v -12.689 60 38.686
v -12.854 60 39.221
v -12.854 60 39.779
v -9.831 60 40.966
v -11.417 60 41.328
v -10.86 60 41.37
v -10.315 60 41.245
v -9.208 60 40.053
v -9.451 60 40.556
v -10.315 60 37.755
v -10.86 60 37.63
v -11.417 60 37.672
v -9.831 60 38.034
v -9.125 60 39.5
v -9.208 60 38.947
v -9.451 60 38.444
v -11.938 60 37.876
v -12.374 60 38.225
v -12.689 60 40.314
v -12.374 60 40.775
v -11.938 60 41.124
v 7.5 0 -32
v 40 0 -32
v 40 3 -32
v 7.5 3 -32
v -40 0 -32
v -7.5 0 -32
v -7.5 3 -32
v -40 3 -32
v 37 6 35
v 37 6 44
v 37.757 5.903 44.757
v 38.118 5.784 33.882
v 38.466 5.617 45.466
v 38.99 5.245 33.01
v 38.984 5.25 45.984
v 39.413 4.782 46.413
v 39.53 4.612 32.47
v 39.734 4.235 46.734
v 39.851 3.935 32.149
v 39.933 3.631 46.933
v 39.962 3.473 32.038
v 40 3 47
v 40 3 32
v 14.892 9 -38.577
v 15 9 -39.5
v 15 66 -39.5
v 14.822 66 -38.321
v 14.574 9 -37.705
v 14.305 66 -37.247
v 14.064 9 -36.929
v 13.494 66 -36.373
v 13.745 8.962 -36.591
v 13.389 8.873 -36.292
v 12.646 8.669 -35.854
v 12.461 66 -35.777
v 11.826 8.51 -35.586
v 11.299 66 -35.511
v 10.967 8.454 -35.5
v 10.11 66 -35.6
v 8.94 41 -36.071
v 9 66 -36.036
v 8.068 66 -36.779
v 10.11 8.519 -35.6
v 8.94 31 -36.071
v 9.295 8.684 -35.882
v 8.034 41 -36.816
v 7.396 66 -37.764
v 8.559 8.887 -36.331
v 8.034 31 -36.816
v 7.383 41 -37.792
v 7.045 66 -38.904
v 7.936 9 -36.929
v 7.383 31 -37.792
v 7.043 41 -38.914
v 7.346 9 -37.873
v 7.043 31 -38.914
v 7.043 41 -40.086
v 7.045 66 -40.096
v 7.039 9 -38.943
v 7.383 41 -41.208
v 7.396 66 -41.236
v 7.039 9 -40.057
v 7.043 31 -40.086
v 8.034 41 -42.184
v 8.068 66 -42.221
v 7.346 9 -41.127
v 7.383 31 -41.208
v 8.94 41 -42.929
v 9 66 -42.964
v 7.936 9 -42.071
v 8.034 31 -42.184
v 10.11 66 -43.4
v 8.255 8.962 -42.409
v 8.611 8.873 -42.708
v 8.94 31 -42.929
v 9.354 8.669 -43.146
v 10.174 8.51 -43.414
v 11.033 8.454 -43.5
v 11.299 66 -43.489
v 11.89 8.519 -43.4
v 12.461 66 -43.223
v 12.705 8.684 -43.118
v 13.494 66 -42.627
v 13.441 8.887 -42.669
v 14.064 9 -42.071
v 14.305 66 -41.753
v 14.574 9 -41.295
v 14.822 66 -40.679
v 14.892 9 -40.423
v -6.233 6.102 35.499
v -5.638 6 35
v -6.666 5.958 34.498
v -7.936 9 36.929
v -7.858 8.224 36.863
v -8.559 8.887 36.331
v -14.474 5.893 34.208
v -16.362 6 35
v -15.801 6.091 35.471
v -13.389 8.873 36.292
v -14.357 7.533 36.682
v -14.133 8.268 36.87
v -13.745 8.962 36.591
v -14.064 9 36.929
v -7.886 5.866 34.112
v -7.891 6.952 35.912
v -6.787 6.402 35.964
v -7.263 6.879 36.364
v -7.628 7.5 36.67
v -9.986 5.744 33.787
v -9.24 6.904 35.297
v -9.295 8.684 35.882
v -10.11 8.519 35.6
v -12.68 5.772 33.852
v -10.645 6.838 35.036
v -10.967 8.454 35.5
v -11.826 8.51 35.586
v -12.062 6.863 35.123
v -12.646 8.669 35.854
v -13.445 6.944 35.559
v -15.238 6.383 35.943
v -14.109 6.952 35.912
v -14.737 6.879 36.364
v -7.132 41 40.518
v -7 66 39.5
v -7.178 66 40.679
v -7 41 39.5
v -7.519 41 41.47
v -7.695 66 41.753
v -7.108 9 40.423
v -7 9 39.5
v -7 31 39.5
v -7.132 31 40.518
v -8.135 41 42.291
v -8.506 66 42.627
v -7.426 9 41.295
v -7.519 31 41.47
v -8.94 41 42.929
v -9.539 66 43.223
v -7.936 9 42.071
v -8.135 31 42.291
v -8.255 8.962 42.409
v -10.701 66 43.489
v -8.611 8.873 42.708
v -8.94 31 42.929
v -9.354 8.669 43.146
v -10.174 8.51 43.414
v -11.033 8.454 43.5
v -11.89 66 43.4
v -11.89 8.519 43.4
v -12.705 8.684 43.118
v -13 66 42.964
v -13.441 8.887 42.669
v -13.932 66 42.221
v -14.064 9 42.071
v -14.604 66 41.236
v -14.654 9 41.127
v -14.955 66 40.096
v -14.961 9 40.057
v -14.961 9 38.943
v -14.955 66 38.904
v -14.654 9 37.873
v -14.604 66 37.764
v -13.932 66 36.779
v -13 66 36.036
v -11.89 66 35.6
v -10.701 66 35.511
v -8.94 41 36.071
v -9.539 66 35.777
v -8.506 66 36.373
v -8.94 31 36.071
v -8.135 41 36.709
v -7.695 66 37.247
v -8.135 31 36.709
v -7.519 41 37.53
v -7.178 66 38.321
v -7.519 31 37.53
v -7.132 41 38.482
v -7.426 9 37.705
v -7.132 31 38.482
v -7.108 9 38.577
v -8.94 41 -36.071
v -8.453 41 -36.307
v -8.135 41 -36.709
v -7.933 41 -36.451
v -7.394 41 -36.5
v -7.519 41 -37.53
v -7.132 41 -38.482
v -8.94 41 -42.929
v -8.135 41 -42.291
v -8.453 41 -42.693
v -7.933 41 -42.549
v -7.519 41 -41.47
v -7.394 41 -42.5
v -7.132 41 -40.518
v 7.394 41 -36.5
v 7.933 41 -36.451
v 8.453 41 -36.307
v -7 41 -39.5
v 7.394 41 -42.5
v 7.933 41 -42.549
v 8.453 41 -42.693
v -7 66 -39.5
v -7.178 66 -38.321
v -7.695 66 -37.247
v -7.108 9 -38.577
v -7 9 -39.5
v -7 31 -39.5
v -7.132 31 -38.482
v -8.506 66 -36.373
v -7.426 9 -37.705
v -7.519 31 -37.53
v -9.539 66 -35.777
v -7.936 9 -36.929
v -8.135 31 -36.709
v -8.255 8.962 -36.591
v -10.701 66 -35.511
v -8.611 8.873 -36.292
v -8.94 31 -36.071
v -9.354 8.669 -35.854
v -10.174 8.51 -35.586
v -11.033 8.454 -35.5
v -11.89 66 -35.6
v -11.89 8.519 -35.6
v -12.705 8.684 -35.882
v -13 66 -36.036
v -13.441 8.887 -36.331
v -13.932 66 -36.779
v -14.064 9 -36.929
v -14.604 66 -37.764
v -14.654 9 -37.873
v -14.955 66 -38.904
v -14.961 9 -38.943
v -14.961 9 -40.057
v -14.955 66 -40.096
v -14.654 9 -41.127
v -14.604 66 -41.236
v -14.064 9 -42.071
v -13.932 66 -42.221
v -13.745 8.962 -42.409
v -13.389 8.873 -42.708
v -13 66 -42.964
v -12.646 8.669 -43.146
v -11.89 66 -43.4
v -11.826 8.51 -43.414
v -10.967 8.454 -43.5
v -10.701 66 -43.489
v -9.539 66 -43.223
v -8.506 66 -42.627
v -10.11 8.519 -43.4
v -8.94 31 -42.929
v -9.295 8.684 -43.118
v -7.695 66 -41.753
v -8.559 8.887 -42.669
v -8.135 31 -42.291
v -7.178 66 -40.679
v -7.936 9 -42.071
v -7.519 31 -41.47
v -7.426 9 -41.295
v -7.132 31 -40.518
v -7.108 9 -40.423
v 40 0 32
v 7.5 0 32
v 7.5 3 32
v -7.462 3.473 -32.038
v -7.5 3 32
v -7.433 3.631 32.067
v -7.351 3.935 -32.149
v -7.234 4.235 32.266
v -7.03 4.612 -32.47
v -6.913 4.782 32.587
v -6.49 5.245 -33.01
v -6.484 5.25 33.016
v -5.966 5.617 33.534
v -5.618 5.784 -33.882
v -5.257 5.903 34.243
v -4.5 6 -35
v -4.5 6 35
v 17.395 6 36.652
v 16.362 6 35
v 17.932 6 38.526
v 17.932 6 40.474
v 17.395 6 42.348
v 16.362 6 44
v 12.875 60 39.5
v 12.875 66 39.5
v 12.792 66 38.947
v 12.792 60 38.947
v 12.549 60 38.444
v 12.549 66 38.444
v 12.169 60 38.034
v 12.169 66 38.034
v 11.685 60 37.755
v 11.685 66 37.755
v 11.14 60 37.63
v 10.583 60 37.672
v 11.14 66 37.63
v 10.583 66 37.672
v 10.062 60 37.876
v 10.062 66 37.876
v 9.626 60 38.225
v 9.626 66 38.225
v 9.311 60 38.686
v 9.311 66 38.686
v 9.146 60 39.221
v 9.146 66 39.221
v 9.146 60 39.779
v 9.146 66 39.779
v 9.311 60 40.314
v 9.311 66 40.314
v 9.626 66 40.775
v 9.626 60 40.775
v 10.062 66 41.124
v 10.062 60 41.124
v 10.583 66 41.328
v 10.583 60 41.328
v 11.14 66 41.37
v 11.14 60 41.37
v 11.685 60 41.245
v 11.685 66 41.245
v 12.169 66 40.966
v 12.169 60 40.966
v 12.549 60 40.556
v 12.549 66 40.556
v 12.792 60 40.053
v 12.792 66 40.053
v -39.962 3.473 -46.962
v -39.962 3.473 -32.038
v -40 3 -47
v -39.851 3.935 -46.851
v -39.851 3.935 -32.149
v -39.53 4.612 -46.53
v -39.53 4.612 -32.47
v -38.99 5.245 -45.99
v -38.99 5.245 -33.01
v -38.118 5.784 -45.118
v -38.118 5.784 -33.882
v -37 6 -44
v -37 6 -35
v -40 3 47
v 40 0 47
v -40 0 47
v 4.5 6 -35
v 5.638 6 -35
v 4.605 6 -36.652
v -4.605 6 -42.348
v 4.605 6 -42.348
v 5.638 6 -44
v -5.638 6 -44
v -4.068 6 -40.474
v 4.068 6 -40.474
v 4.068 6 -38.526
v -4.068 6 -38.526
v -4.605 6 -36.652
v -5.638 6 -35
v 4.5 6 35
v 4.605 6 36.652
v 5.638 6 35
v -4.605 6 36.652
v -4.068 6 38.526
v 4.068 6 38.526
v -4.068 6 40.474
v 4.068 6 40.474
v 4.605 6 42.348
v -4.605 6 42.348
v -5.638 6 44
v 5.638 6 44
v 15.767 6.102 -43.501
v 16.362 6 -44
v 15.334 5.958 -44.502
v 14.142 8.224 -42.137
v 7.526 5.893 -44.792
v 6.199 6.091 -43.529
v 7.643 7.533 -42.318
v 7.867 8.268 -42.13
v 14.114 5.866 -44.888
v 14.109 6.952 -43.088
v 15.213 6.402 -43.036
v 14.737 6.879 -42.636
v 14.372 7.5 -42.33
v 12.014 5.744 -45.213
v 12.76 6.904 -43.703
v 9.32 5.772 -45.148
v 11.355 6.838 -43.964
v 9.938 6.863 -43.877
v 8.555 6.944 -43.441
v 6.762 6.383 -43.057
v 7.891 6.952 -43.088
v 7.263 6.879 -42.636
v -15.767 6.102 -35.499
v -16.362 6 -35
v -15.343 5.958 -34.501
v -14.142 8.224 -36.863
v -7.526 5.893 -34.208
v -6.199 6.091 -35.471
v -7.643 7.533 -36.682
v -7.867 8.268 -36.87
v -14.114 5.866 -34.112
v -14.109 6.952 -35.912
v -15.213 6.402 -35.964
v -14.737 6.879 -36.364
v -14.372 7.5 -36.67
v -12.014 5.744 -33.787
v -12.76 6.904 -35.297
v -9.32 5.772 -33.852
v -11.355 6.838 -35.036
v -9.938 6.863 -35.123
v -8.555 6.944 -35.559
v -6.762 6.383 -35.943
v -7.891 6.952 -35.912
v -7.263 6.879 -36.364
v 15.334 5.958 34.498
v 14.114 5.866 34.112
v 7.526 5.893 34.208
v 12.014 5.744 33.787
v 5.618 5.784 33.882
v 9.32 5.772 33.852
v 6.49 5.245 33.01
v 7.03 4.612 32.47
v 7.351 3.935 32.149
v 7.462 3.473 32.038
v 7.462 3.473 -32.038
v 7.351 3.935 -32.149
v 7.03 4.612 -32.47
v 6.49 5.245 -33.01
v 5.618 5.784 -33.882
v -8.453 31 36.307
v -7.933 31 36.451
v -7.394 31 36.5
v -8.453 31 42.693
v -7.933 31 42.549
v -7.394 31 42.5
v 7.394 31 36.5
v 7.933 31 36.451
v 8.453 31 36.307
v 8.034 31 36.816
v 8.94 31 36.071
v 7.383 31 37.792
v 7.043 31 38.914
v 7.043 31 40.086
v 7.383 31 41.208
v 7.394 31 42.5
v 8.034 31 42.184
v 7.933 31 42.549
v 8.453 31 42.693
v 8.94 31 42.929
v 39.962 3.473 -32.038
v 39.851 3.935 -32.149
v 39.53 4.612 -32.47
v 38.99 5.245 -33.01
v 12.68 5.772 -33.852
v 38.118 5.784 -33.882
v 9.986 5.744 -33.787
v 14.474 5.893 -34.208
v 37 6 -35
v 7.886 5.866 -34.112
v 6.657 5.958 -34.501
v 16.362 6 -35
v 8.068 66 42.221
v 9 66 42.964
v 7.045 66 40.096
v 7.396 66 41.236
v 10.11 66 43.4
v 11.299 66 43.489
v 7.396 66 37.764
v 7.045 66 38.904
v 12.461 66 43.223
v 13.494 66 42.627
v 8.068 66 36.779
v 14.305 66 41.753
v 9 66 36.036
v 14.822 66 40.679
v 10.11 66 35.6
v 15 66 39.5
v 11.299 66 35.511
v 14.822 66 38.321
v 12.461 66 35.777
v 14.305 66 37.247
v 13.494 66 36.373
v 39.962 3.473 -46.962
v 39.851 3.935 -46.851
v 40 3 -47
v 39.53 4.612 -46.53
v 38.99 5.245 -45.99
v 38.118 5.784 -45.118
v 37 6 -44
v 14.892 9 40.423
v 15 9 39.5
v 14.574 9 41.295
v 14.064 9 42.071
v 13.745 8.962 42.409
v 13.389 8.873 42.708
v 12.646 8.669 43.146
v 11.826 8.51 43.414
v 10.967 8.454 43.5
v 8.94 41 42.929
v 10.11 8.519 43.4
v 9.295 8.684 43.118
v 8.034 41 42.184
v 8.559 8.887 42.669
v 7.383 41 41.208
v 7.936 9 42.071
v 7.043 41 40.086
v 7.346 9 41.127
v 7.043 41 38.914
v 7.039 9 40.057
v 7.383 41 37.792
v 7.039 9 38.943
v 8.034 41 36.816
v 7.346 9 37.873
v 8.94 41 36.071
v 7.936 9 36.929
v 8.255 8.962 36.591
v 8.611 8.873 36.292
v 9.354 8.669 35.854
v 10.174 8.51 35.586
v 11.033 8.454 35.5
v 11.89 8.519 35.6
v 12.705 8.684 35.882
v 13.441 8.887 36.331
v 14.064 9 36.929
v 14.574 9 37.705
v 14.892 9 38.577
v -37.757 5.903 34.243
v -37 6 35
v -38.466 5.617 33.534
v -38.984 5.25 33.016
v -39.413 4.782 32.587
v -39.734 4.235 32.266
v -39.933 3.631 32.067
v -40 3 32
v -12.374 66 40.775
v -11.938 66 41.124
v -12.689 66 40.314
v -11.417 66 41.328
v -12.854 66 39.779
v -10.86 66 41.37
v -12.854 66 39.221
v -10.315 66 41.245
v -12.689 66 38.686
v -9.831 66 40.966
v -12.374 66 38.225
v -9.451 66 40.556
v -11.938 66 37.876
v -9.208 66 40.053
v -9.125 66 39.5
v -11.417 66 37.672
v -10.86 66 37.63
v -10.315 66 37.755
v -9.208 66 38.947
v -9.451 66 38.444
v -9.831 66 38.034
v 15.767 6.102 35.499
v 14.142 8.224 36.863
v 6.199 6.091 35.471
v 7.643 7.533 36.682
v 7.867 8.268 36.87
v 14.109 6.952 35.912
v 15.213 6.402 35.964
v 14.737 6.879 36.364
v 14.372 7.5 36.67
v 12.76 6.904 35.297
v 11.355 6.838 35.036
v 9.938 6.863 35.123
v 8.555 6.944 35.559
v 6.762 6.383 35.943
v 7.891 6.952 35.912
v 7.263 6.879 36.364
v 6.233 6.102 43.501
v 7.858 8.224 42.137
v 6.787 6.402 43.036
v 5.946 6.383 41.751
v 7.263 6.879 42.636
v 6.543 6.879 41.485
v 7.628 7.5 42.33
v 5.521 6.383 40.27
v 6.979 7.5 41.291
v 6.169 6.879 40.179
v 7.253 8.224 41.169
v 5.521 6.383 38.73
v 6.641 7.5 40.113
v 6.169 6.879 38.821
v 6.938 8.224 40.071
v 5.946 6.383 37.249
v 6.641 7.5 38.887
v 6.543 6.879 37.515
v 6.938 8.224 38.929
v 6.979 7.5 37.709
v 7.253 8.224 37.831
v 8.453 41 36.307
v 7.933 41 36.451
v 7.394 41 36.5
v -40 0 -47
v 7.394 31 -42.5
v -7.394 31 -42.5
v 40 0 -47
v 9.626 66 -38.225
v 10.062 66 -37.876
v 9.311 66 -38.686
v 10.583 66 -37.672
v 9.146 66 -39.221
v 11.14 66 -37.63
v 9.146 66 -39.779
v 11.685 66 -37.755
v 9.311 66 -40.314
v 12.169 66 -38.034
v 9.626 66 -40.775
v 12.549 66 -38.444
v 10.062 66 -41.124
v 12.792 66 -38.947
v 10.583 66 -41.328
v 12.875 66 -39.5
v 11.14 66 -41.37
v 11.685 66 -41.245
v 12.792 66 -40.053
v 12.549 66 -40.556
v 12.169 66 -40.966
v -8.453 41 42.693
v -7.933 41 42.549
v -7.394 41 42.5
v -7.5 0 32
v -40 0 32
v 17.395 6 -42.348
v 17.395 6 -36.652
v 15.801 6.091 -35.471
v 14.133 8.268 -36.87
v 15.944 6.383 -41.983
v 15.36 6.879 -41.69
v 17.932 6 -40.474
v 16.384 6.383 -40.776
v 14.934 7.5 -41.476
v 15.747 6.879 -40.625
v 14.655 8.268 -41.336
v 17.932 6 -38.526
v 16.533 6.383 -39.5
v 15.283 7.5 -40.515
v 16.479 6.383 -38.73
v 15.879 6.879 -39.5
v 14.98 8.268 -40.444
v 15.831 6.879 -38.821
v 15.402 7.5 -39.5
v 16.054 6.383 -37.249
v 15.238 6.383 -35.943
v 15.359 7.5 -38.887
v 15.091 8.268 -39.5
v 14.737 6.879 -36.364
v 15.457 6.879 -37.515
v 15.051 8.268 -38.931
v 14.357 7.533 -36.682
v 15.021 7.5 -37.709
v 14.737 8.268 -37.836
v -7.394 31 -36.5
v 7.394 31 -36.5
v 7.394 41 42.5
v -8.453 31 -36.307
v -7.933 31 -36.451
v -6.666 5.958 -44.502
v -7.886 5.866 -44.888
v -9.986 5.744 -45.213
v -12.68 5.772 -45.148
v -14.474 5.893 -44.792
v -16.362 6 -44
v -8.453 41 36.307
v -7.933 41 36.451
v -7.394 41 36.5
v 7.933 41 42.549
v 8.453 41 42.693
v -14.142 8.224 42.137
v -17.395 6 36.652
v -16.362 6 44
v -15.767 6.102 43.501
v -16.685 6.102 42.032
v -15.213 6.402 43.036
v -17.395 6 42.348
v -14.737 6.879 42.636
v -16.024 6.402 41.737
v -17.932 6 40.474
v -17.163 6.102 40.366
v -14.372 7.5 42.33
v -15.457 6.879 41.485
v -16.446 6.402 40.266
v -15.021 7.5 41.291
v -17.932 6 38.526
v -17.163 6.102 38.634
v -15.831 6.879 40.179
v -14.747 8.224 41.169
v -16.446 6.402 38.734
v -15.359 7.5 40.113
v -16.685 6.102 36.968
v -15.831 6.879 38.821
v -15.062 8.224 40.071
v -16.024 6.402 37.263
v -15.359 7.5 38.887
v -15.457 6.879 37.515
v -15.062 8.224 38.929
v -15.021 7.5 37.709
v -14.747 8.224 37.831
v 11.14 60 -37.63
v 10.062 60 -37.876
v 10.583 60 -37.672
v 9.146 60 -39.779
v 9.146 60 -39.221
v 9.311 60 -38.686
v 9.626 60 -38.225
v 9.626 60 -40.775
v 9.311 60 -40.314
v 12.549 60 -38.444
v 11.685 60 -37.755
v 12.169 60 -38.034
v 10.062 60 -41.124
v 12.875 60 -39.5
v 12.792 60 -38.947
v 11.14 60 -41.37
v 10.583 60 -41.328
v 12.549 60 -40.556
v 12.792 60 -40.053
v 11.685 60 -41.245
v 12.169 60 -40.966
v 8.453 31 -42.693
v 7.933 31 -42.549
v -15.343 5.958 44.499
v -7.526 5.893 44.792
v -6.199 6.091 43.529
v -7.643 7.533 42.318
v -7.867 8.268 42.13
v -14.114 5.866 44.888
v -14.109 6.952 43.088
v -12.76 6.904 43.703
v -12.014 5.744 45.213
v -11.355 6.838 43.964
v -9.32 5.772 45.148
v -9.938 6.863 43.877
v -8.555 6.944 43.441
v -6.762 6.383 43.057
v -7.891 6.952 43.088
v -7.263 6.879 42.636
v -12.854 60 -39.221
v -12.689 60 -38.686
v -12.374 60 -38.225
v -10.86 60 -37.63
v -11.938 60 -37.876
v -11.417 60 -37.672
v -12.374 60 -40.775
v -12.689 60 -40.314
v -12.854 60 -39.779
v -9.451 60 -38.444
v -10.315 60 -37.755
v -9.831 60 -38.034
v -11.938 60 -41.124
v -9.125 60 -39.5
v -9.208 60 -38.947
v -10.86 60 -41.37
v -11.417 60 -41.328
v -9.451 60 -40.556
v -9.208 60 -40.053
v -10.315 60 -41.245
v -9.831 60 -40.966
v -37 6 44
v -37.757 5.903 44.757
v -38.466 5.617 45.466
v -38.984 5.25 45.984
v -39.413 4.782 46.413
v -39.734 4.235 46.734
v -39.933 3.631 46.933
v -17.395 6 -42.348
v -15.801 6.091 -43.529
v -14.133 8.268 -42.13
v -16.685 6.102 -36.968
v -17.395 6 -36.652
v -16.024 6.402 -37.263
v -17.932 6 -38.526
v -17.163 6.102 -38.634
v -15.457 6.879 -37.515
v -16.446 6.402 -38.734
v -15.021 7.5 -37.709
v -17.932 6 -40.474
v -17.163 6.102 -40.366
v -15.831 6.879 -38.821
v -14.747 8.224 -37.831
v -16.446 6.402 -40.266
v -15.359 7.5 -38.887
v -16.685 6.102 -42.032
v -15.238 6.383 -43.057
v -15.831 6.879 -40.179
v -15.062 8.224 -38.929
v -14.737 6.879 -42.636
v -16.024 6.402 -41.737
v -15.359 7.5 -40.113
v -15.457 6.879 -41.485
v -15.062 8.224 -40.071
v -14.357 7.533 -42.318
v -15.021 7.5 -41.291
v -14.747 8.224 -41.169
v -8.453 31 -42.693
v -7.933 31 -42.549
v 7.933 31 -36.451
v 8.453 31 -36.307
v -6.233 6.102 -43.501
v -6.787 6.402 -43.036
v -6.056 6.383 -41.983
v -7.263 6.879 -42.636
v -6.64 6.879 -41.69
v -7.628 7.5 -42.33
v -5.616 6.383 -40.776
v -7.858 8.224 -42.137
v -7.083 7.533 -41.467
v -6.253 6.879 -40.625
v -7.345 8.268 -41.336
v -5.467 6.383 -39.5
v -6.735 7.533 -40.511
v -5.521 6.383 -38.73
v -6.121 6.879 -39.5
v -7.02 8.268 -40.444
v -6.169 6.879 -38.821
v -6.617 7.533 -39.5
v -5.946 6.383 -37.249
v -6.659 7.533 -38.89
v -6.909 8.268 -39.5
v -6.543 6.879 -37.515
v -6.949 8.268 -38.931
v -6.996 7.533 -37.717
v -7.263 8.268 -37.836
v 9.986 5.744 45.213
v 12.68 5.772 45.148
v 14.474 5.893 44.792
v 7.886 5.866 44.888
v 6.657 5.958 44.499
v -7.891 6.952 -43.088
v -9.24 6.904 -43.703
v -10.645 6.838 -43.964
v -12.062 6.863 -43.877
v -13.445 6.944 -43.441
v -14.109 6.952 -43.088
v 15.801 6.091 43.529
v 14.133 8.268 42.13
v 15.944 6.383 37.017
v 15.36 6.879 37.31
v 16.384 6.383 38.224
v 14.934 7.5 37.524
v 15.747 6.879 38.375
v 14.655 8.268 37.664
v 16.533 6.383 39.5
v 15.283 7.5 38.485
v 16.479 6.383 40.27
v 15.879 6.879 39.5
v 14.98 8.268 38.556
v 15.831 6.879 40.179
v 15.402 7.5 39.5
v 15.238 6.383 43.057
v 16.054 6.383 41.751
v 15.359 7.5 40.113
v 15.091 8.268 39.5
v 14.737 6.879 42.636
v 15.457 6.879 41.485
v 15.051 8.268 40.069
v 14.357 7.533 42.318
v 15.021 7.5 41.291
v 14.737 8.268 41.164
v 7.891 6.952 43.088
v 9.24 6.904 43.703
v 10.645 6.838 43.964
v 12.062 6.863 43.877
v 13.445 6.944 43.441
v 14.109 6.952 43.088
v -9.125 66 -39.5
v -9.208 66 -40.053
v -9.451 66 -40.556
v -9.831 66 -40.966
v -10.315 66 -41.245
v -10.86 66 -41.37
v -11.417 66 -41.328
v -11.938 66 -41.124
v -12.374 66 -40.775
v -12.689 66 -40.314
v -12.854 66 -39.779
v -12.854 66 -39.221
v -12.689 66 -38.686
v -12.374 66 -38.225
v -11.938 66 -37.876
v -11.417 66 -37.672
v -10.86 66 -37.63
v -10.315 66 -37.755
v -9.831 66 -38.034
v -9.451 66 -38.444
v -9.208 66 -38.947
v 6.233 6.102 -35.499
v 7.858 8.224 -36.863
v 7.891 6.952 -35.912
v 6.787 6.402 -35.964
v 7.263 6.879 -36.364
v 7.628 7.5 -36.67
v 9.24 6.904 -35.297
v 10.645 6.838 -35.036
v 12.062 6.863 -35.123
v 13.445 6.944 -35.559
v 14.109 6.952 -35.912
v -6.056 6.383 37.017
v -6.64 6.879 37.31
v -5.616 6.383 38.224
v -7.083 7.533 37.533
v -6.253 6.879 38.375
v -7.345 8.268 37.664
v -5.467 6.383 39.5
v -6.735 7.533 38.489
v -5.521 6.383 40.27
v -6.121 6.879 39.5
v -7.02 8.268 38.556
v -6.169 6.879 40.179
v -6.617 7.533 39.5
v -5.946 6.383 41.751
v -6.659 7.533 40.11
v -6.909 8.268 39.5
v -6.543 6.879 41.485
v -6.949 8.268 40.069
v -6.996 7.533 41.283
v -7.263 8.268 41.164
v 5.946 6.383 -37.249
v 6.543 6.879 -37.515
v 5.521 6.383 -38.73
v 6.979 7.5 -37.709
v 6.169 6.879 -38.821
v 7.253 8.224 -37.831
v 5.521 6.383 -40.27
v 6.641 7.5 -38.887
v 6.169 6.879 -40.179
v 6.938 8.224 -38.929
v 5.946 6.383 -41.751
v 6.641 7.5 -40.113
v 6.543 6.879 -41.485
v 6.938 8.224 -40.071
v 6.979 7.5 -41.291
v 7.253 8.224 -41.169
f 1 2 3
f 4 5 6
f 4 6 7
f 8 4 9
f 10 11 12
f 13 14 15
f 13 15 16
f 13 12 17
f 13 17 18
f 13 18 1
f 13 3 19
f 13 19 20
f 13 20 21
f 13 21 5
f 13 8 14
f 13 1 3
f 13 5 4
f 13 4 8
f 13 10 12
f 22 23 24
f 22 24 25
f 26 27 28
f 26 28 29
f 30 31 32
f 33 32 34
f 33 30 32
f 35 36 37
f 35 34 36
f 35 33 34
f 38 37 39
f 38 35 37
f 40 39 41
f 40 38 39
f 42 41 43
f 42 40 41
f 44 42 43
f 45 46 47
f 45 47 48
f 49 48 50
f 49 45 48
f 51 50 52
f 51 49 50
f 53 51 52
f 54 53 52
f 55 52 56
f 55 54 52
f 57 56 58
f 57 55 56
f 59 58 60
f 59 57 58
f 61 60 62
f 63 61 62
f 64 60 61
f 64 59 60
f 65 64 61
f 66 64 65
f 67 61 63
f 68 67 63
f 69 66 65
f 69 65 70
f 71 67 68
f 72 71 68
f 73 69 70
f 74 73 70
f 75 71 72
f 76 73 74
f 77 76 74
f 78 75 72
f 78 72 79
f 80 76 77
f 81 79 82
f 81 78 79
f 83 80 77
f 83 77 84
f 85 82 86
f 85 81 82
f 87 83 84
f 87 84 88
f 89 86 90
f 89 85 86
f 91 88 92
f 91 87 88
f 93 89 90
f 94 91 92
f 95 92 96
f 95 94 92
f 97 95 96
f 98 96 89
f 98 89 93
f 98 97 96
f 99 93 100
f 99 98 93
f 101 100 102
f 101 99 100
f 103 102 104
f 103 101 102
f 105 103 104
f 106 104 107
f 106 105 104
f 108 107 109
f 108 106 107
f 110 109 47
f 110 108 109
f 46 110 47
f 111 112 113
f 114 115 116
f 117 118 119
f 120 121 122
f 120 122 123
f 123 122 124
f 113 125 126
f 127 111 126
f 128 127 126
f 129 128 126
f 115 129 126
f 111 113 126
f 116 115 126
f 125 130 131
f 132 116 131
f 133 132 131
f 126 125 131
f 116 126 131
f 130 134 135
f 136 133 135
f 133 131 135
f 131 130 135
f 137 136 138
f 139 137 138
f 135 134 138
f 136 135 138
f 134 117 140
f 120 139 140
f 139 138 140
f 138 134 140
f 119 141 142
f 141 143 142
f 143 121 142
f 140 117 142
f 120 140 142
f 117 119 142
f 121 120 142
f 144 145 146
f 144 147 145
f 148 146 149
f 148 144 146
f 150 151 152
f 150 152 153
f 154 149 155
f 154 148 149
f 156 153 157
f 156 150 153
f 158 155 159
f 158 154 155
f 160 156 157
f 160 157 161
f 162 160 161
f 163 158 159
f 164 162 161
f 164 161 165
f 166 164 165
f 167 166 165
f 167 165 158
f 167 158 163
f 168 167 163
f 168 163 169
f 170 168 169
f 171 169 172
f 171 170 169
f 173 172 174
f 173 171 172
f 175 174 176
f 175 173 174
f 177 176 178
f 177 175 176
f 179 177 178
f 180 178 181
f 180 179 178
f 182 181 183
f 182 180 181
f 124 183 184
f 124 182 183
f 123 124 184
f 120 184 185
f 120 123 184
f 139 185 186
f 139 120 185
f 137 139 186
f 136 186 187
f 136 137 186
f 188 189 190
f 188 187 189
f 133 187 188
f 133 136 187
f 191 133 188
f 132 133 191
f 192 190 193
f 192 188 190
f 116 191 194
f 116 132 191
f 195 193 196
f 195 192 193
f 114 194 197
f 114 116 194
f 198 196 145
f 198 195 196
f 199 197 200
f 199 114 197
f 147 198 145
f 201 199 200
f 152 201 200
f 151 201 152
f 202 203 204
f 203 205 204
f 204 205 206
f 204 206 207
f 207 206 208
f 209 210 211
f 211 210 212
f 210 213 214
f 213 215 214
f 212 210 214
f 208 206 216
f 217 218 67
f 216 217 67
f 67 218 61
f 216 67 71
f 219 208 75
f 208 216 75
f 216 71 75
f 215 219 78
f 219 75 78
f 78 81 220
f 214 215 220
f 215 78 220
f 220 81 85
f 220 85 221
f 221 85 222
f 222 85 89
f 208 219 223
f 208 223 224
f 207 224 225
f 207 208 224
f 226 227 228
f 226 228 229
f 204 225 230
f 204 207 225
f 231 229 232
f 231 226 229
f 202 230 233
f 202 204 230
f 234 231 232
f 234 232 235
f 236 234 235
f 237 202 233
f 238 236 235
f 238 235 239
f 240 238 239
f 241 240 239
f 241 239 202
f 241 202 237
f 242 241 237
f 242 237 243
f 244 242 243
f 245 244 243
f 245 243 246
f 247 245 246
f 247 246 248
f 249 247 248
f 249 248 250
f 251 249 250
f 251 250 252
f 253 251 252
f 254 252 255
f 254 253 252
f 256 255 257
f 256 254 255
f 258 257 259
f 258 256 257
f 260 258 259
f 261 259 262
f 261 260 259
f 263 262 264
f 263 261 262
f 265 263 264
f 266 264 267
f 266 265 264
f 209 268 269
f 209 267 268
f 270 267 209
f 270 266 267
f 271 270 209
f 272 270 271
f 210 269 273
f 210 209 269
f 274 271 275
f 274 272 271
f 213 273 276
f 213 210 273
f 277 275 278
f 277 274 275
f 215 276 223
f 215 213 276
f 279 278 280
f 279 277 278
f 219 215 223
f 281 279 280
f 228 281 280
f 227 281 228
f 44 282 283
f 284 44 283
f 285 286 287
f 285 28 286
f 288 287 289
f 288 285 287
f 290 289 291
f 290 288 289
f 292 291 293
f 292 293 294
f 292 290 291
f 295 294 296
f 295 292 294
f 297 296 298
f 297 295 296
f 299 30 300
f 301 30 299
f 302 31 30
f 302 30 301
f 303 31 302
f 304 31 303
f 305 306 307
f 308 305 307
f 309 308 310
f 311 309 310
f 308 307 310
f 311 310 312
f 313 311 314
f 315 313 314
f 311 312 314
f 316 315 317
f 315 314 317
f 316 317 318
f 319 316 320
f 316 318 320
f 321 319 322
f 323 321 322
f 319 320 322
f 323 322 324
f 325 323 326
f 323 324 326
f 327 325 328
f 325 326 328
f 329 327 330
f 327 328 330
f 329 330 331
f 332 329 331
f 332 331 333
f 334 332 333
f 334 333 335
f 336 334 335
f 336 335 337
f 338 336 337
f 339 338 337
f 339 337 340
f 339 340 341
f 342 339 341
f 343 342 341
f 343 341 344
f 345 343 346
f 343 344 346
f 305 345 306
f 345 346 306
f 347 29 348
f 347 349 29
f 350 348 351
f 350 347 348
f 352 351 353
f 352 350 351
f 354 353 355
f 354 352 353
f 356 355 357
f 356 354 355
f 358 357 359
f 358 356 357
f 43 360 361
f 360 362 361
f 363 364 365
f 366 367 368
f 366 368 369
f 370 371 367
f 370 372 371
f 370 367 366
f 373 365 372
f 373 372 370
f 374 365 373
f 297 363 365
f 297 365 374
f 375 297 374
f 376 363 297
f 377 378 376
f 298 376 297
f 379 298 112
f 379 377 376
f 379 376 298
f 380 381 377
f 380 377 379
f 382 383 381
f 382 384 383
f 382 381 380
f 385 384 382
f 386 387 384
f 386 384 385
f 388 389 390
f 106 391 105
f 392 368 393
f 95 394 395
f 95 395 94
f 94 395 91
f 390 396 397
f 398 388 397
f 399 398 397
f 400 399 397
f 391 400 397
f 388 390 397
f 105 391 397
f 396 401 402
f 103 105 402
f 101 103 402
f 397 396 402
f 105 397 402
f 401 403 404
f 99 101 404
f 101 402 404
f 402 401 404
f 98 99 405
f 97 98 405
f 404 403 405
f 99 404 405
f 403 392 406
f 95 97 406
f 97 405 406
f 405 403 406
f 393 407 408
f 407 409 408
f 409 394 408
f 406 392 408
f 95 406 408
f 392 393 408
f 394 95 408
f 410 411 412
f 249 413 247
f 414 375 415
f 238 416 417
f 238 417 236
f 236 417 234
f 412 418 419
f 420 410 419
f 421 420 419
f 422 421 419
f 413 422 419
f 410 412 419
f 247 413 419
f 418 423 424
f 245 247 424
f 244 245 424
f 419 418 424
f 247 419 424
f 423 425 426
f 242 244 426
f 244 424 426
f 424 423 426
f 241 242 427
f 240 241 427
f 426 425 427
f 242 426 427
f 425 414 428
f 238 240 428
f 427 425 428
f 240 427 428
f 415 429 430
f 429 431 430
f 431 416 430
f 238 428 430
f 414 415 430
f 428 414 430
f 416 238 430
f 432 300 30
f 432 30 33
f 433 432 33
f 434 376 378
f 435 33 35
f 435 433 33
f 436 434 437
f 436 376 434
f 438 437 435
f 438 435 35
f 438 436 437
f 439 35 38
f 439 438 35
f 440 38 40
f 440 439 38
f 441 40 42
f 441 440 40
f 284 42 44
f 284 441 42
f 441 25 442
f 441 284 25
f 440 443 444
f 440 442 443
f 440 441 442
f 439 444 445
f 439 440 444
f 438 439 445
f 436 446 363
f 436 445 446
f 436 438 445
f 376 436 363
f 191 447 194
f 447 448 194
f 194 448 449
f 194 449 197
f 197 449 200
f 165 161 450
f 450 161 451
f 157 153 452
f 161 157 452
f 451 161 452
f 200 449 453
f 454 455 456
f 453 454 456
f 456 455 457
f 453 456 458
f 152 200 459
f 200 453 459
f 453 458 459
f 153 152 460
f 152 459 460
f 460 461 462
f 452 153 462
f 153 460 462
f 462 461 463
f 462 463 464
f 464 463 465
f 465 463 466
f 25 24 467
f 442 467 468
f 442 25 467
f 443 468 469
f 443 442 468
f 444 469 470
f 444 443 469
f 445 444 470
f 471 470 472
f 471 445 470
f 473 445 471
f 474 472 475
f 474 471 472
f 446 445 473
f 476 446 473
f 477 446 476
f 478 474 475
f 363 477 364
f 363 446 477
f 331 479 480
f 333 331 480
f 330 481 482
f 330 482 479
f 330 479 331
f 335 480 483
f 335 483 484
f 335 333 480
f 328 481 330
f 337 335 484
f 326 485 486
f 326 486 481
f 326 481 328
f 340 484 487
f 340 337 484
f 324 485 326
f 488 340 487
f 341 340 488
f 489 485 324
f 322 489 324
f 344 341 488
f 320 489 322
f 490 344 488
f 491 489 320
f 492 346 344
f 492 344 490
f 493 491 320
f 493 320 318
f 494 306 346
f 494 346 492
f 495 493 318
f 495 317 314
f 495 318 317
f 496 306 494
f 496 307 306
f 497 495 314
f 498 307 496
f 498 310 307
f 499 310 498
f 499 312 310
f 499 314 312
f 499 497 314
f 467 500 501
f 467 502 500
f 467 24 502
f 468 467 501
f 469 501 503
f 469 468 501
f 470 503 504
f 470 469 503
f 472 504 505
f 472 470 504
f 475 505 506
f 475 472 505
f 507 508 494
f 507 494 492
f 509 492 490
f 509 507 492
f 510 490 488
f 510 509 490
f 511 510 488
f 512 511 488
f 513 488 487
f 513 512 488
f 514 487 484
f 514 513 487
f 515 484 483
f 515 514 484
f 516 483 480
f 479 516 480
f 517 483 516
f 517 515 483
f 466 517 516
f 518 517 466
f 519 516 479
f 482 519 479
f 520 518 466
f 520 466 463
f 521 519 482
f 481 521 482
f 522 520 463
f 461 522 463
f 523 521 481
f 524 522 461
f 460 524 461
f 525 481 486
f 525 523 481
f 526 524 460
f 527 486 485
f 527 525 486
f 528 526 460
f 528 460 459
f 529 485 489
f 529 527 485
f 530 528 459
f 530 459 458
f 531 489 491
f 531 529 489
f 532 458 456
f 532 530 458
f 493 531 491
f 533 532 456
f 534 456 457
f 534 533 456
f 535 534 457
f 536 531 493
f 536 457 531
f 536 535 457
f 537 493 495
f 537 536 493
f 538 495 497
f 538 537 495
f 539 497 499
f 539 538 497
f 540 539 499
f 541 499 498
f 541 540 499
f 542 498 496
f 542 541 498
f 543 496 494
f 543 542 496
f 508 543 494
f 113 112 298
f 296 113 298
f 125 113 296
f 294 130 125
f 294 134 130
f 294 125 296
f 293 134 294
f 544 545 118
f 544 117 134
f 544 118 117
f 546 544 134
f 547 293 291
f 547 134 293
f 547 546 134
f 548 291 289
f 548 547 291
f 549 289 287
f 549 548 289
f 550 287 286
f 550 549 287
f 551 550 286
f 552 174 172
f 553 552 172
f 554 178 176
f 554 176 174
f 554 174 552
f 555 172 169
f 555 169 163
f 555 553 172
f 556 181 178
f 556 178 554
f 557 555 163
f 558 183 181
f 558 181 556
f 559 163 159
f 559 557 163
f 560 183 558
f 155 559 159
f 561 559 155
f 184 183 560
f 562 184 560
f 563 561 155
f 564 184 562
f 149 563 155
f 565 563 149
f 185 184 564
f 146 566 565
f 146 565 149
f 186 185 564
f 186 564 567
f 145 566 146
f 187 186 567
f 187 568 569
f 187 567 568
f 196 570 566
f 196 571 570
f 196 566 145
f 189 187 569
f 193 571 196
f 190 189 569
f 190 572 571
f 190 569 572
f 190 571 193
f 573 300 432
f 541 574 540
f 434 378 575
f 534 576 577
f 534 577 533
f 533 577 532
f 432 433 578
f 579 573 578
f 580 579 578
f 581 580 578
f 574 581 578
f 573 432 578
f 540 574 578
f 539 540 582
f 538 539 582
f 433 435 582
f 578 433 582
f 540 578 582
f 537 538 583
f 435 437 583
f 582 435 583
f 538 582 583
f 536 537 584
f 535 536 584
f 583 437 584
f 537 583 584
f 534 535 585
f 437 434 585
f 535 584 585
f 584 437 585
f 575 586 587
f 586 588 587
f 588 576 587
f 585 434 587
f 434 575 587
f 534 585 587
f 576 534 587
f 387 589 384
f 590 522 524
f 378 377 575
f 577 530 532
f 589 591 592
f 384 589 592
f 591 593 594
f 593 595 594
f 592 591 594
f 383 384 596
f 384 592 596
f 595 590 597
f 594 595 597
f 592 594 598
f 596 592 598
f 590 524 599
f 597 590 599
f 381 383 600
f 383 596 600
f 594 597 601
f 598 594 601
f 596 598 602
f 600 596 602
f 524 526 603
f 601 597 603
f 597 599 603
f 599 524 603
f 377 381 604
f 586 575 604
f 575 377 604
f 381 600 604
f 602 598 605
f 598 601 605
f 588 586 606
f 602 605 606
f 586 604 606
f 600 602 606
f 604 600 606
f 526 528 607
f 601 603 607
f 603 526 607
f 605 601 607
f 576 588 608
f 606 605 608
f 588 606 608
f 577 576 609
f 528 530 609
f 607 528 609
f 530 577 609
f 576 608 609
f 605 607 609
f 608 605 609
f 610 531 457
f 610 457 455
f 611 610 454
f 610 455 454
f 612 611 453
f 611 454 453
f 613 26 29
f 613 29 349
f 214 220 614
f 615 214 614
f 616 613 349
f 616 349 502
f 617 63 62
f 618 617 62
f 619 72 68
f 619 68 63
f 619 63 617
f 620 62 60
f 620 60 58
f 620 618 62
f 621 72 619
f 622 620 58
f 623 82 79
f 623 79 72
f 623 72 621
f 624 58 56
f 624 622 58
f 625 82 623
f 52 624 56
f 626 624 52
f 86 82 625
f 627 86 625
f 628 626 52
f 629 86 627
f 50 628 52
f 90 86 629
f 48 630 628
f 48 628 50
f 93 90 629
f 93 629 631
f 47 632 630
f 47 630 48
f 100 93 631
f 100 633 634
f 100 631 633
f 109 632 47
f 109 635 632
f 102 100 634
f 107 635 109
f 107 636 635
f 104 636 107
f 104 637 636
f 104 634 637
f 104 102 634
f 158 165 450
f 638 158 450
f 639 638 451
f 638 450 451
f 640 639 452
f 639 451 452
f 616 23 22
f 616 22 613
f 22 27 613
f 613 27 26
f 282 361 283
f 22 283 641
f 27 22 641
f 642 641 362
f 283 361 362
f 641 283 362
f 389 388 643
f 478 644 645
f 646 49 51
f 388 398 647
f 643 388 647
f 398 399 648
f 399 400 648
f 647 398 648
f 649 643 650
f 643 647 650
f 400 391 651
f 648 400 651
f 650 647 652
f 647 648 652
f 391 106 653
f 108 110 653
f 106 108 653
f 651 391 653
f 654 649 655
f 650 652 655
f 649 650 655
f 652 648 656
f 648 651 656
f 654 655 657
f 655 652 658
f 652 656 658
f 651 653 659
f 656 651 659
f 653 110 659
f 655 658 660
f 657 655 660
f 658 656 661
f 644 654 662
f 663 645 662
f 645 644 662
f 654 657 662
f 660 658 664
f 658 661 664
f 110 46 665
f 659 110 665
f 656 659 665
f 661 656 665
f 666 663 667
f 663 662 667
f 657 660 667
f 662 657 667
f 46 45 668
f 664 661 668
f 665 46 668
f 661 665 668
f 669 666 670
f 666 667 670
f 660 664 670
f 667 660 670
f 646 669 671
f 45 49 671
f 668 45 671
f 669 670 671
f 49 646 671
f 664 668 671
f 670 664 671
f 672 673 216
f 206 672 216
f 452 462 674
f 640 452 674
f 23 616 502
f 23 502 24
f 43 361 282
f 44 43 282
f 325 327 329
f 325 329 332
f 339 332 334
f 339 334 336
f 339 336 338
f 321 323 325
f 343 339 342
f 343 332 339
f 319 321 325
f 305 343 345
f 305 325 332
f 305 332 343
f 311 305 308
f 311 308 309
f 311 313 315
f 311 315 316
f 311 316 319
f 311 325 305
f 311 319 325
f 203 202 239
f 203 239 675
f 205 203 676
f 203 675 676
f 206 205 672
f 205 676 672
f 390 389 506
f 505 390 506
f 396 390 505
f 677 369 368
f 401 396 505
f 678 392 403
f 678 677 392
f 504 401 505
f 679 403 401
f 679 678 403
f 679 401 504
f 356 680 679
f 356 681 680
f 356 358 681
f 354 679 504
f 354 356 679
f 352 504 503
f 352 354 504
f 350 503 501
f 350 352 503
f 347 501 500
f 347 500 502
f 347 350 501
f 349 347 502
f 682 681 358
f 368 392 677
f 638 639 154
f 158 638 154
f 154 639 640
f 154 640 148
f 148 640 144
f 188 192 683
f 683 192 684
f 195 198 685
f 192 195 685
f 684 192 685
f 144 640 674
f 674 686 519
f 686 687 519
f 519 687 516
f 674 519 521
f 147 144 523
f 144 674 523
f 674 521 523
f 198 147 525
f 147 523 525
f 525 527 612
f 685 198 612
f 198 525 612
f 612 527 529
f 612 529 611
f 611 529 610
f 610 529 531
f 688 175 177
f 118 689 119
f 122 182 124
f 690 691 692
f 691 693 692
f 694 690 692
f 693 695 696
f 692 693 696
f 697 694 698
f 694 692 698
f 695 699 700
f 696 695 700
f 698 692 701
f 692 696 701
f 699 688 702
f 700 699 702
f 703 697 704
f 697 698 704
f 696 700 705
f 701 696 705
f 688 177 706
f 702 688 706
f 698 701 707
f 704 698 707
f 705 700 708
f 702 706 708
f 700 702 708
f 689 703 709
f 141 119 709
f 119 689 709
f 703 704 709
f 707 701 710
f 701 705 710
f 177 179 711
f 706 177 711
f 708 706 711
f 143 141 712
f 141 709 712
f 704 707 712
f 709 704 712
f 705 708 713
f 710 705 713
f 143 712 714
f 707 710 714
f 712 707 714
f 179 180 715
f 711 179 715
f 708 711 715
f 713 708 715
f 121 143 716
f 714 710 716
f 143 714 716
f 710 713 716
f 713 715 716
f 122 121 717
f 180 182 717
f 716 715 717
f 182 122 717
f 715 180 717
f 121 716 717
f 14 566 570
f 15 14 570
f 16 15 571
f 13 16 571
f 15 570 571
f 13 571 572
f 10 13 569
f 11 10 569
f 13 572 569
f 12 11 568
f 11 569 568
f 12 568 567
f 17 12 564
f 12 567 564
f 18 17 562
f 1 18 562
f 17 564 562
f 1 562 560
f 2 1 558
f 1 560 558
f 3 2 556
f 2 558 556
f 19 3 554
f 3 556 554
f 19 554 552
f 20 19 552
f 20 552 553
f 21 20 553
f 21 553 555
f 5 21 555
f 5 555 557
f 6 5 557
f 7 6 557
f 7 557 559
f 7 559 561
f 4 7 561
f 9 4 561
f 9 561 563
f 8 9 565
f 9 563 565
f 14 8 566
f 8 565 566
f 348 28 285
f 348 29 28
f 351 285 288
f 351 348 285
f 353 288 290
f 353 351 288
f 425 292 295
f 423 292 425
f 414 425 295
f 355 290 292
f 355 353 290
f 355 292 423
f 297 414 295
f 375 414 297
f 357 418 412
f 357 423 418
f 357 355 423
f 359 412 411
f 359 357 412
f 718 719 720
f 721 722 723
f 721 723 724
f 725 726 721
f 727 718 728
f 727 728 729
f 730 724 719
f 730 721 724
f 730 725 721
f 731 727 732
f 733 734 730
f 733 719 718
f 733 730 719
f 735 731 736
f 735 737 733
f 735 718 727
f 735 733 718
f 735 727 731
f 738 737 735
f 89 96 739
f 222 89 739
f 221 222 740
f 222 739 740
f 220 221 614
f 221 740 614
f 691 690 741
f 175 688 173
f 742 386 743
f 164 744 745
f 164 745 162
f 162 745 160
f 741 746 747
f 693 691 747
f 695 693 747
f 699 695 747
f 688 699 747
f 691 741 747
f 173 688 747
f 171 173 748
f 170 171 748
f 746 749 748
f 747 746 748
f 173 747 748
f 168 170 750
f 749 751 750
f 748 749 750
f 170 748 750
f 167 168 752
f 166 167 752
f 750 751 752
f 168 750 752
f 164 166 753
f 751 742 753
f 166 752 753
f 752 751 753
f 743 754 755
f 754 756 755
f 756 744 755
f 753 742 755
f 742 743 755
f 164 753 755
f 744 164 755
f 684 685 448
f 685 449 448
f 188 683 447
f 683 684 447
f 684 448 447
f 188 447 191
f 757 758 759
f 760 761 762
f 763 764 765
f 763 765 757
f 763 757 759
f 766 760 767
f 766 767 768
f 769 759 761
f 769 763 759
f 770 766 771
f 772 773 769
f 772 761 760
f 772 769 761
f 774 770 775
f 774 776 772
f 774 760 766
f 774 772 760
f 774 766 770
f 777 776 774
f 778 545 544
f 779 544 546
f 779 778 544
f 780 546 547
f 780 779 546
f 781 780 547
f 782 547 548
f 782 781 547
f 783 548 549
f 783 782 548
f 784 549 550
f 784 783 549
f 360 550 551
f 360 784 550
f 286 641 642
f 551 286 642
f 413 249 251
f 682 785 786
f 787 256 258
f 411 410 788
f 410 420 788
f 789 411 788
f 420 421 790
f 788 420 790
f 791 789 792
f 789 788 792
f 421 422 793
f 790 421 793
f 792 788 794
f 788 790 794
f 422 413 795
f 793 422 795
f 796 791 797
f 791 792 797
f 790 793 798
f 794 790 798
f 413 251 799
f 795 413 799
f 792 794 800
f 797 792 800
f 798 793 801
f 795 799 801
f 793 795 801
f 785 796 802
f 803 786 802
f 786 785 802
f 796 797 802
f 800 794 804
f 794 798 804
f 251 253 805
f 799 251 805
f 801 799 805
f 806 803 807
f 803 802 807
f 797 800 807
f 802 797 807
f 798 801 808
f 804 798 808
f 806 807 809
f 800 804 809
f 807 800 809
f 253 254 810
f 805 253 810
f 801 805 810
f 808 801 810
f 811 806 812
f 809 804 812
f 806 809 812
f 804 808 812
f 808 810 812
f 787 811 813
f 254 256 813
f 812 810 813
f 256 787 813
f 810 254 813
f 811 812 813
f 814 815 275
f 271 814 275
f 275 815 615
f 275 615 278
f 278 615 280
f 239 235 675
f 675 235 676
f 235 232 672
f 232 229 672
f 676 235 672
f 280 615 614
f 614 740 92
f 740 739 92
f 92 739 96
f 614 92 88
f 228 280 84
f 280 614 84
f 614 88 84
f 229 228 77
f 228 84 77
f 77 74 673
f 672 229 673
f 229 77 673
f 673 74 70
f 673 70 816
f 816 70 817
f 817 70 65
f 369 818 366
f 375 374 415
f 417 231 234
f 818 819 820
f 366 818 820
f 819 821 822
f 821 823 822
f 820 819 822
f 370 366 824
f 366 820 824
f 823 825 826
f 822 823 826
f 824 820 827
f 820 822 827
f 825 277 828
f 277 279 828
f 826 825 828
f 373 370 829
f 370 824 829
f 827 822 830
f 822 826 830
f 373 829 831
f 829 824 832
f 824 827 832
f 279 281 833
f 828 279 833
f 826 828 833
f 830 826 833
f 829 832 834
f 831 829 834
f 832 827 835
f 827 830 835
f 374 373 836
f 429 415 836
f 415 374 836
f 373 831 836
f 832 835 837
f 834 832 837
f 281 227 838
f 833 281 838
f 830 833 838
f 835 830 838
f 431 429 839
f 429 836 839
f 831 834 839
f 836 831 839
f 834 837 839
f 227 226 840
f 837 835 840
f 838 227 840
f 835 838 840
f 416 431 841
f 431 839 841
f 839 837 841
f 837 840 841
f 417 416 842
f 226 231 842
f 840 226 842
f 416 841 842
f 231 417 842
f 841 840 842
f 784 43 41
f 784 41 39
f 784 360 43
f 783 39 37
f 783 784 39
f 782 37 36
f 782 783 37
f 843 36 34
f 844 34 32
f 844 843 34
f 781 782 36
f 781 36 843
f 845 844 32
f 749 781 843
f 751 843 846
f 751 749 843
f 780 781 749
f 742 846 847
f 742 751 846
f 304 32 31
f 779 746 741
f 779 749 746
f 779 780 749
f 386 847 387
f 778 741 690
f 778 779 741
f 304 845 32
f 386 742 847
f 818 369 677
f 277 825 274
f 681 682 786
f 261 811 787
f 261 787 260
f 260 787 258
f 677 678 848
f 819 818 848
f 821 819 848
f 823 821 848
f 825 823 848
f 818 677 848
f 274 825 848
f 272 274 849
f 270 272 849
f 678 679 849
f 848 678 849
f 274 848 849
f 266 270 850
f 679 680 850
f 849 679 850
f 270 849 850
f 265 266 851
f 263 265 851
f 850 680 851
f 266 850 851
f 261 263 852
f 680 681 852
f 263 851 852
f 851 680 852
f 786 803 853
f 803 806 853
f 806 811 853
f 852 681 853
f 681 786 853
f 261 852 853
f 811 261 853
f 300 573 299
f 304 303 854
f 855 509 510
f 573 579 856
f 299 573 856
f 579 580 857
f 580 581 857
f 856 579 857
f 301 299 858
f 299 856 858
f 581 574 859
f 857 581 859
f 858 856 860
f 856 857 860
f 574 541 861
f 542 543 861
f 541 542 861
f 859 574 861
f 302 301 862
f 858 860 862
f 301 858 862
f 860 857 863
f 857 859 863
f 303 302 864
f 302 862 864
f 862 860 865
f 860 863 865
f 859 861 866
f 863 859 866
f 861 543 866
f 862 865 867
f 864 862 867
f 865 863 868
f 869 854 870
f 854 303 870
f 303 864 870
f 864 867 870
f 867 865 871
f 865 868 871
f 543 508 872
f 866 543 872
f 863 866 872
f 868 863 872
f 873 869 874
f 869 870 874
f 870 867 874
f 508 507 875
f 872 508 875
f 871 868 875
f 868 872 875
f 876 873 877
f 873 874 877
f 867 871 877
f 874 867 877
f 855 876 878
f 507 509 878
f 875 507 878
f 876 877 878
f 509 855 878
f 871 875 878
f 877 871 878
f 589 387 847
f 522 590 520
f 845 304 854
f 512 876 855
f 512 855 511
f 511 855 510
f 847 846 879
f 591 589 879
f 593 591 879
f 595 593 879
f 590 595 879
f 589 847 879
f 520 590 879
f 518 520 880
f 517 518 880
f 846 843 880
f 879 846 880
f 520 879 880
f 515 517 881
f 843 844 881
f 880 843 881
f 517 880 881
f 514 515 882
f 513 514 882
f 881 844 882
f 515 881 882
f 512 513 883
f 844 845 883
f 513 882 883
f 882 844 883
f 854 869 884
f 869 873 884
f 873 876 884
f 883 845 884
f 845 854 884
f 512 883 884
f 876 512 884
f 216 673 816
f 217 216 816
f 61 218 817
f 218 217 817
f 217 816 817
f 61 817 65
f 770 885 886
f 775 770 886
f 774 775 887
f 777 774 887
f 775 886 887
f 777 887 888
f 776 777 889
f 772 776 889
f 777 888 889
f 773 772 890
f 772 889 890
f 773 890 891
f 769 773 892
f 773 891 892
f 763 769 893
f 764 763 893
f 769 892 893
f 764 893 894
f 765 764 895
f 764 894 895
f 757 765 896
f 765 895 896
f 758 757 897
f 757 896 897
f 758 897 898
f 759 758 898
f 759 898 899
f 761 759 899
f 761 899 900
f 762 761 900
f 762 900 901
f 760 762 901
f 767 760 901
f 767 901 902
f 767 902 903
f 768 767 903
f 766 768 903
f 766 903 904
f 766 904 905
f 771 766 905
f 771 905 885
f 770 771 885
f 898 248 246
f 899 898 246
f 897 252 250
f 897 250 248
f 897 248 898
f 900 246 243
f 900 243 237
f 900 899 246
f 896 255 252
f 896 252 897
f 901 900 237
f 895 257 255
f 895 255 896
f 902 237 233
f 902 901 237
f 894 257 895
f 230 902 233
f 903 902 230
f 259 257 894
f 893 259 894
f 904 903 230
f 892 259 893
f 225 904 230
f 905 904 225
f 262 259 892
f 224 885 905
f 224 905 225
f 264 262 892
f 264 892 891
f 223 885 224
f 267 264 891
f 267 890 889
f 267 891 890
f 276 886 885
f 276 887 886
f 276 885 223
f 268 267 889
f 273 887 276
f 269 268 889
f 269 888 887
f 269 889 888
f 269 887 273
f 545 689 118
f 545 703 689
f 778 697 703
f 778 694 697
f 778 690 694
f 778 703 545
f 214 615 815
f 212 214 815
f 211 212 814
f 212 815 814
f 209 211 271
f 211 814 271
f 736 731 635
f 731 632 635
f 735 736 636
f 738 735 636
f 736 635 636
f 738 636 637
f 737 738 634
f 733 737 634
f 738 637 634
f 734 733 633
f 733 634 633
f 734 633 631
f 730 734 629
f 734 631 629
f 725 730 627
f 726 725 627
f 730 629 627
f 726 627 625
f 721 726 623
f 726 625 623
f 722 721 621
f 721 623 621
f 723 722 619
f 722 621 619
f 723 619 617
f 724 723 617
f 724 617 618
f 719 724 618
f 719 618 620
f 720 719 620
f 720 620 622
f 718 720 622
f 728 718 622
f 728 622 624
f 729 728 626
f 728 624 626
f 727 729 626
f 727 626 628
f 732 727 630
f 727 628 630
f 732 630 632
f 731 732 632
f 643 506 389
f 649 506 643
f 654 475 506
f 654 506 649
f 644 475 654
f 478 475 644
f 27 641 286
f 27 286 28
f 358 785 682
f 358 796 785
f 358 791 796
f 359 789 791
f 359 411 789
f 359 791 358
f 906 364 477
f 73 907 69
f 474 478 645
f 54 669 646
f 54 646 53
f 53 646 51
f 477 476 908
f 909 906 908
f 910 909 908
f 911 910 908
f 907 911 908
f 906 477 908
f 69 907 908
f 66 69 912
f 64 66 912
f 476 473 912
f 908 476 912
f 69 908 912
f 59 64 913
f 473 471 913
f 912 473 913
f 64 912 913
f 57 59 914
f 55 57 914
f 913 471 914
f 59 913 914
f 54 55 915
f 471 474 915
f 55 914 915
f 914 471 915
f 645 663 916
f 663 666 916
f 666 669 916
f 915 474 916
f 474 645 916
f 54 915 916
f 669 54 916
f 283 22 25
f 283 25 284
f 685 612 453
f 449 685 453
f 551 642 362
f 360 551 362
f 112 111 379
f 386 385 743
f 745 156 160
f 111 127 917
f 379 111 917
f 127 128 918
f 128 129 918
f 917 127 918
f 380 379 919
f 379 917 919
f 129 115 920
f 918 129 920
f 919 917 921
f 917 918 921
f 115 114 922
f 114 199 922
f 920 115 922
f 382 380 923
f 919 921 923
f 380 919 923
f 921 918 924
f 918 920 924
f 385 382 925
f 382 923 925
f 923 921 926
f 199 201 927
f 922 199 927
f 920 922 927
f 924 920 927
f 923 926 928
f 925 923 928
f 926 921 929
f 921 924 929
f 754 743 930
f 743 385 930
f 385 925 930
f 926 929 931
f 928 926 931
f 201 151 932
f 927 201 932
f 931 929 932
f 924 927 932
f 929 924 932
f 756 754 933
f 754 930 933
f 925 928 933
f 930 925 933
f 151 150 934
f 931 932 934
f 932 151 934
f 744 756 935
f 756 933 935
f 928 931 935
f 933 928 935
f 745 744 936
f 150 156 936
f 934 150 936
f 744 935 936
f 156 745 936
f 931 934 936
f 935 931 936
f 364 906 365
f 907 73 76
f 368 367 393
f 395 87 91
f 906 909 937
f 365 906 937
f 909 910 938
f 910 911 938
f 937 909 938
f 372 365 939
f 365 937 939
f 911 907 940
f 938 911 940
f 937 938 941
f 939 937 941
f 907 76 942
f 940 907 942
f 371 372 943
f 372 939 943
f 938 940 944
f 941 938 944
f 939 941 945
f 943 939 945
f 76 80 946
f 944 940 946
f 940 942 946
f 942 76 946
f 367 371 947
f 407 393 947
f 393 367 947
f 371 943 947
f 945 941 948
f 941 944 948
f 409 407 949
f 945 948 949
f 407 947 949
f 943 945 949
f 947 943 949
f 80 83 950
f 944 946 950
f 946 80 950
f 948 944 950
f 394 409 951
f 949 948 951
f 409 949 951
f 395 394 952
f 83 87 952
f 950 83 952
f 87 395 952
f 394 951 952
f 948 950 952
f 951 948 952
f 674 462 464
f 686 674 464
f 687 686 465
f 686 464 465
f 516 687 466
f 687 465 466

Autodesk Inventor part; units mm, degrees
ref_plane "XZ Plane" through (0, 0, 0) normal (0, 1, 0) x (-1, 0, 0)
ref_plane "XY Plane" through (0, 0, 0) normal (0, 0, 1) x (1, 0, 0)
sketch "Sketch1" plane through (0, 0, 0) normal (0, 1, 0) x (-1, 0, 0)
  line L0 (40, 47) -> (-40, 47)
  line L1 (-40, 47) -> (-40, 32)
  line L2 (-40, 32) -> (40, 32)
  line L3 (40, 32) -> (40, 47)
  line L4 (40, 39.5) -> (-40, 39.5) construction
  line L5 (0, -65.8) -> (0, 65.8) projected
  line L6 (75.7321, 0) -> (-79.5679, 0) construction
  line L7 (40, -47) -> (-40, -47)
  line L8 (-40, -47) -> (-40, -32)
  line L9 (-40, -32) -> (40, -32)
  line L10 (40, -32) -> (40, -47)
  line L11 (40, -39.5) -> (-40, -39.5) construction
  line L12 (0, 32) -> (7.5, 32)
  line L13 (7.5, 32) -> (7.5, -32)
  line L14 (0, -32) -> (-7.5, -32)
  line L15 (-7.5, -32) -> (-7.5, 32)
  point P0 (0, 0)
  dimension "d0" = 80
  dimension "d1" = 15
  dimension "d12" = 39.5
  dimension "d13" = 79
  dimension "d14" = 7.5
  dimension "d15" = 7.5
extrude "Extrusion1" add sketch "Sketch1" along normal blind 6
fillet "Fillet1" radius 3 12 edges at (0, 6, 47) (40, 6, 39.5) (-23.75, 6, 32) (23.75, 6, 32) (-40, 6, 39.5) (23.75, 6, -32) (-23.75, 6, -32) (40, 6, -39.5) (0, 6, -47) (-40, 6, -39.5) (7.5, 6, 0) (-7.5, 6, 0)
sketch "Sketch2" plane through (0, 6, 0) normal (0, 1, 0) x (1, 0, 0)
  line L0 (-37, -35) -> (-4.5, -35) projected
  line L1 (-37, -44) -> (-37, -35) projected
  line L2 (37, -44) -> (-37, -44) projected
  line L3 (37, -35) -> (37, -44) projected
  line L4 (-37, -44) -> (-37, -35) construction
  line L5 (-37, -39.5) -> (37, -39.5) construction
  line L6 (37, -35) -> (37, -44) construction
  line L7 (-37, -35) -> (37, -35) construction
  line L8 (0, -35) -> (0, -44) construction
  circle A0 centre (-11, -39.5) radius 4
  circle A1 centre (11, -39.5) radius 4
  line L9 (0, 65.8) -> (0, -65.8) construction
  line L10 (4.5, -35) -> (37, -35) projected
  line L11 (37, 35) -> (4.5, 35) projected
  line L12 (37, 44) -> (37, 35) projected
  line L13 (-37, 44) -> (37, 44) projected
  line L14 (-37, 35) -> (-37, 44) projected
  line L15 (-4.5, 35) -> (-37, 35) projected
  line L16 (-4.5, -35) -> (-4.5, 35) projected
  line L17 (4.5, 35) -> (4.5, -35) projected
  line L18 (-56, 0) -> (56, 0) projected
  circle A2 centre (-11, 39.5) radius 4
  circle A3 centre (11, 39.5) radius 4
  point P0 (0, 0)
  dimension "d5" = 8
  dimension "d6" = 22
extrude "Extrusion2" add sketch "Sketch2" along normal blind 60 contours A0 | A1 | A2 | A3
fillet "Fillet2" radius 3 4 edges at (-15, 6, 39.5) (7, 6, 39.5) (7, 6, -39.5) (-15, 6, -39.5)
sketch "Sketch3" plane through (-11, 66, 39.5) normal (0, 1, 0) x (1, 0, 0)
  circle A0 centre (0, 0) radius 1.875
  circle A1 centre (22, 0) radius 4 projected
  circle A2 centre (22, 0) radius 1.875
  line L0 (-45, 39.5) -> (67, 39.5) projected
  circle A3 centre (0, 79) radius 1.875
  circle A4 centre (22, 79) radius 1.875
  point P0 (11, 39.5)
  dimension "d10" = 3.75
  dimension "d11" = 3.75
extrude "Extrusion3" cut sketch "Sketch3" against normal blind 6 contours A0 | A2 | A3 | A4
ref_plane "Work Plane1" through (11, 0, 0) normal (1, 0, 0) x (0, 1, 0)
sketch "Sketch4" plane through (11, 0, 0) normal (1, 0, 0) x (0, 1, 0)
  line L0 (41, -42.5) -> (31, -42.5)
  line L1 (31, -42.5) -> (31, -36.5)
  line L2 (31, -36.5) -> (41, -36.5)
  line L3 (41, -36.5) -> (41, -42.5)
  line L4 (120.1597, -39.5) -> (56.9301, -39.5) construction
  line L5 (6, 35) -> (6, -35) projected
  line L6 (8.4544, -35.5) -> (66, -35.5) projected
  line L7 (8.4544, -43.5) -> (66, -43.5) projected
  point P0 (0, 0)
  point P1 (31, -39.5)
  dimension "d19" = 6
  dimension "d20" = 10
  dimension "d21" = 25
  dimension "d23" = 1
extrude "Extrusion4" add sketch "Sketch4" against normal blind 22
fillet "Fillet3" radius 3 4 edges at (8.3542, 36, -42.5) (-8.3542, 36, -42.5) (-8.3542, 36, -36.5) (8.3542, 36, -36.5)
mirror "Mirror1" about plane through (0, 0, 0) normal (0, 0, 1)
properties part number "carrello"
